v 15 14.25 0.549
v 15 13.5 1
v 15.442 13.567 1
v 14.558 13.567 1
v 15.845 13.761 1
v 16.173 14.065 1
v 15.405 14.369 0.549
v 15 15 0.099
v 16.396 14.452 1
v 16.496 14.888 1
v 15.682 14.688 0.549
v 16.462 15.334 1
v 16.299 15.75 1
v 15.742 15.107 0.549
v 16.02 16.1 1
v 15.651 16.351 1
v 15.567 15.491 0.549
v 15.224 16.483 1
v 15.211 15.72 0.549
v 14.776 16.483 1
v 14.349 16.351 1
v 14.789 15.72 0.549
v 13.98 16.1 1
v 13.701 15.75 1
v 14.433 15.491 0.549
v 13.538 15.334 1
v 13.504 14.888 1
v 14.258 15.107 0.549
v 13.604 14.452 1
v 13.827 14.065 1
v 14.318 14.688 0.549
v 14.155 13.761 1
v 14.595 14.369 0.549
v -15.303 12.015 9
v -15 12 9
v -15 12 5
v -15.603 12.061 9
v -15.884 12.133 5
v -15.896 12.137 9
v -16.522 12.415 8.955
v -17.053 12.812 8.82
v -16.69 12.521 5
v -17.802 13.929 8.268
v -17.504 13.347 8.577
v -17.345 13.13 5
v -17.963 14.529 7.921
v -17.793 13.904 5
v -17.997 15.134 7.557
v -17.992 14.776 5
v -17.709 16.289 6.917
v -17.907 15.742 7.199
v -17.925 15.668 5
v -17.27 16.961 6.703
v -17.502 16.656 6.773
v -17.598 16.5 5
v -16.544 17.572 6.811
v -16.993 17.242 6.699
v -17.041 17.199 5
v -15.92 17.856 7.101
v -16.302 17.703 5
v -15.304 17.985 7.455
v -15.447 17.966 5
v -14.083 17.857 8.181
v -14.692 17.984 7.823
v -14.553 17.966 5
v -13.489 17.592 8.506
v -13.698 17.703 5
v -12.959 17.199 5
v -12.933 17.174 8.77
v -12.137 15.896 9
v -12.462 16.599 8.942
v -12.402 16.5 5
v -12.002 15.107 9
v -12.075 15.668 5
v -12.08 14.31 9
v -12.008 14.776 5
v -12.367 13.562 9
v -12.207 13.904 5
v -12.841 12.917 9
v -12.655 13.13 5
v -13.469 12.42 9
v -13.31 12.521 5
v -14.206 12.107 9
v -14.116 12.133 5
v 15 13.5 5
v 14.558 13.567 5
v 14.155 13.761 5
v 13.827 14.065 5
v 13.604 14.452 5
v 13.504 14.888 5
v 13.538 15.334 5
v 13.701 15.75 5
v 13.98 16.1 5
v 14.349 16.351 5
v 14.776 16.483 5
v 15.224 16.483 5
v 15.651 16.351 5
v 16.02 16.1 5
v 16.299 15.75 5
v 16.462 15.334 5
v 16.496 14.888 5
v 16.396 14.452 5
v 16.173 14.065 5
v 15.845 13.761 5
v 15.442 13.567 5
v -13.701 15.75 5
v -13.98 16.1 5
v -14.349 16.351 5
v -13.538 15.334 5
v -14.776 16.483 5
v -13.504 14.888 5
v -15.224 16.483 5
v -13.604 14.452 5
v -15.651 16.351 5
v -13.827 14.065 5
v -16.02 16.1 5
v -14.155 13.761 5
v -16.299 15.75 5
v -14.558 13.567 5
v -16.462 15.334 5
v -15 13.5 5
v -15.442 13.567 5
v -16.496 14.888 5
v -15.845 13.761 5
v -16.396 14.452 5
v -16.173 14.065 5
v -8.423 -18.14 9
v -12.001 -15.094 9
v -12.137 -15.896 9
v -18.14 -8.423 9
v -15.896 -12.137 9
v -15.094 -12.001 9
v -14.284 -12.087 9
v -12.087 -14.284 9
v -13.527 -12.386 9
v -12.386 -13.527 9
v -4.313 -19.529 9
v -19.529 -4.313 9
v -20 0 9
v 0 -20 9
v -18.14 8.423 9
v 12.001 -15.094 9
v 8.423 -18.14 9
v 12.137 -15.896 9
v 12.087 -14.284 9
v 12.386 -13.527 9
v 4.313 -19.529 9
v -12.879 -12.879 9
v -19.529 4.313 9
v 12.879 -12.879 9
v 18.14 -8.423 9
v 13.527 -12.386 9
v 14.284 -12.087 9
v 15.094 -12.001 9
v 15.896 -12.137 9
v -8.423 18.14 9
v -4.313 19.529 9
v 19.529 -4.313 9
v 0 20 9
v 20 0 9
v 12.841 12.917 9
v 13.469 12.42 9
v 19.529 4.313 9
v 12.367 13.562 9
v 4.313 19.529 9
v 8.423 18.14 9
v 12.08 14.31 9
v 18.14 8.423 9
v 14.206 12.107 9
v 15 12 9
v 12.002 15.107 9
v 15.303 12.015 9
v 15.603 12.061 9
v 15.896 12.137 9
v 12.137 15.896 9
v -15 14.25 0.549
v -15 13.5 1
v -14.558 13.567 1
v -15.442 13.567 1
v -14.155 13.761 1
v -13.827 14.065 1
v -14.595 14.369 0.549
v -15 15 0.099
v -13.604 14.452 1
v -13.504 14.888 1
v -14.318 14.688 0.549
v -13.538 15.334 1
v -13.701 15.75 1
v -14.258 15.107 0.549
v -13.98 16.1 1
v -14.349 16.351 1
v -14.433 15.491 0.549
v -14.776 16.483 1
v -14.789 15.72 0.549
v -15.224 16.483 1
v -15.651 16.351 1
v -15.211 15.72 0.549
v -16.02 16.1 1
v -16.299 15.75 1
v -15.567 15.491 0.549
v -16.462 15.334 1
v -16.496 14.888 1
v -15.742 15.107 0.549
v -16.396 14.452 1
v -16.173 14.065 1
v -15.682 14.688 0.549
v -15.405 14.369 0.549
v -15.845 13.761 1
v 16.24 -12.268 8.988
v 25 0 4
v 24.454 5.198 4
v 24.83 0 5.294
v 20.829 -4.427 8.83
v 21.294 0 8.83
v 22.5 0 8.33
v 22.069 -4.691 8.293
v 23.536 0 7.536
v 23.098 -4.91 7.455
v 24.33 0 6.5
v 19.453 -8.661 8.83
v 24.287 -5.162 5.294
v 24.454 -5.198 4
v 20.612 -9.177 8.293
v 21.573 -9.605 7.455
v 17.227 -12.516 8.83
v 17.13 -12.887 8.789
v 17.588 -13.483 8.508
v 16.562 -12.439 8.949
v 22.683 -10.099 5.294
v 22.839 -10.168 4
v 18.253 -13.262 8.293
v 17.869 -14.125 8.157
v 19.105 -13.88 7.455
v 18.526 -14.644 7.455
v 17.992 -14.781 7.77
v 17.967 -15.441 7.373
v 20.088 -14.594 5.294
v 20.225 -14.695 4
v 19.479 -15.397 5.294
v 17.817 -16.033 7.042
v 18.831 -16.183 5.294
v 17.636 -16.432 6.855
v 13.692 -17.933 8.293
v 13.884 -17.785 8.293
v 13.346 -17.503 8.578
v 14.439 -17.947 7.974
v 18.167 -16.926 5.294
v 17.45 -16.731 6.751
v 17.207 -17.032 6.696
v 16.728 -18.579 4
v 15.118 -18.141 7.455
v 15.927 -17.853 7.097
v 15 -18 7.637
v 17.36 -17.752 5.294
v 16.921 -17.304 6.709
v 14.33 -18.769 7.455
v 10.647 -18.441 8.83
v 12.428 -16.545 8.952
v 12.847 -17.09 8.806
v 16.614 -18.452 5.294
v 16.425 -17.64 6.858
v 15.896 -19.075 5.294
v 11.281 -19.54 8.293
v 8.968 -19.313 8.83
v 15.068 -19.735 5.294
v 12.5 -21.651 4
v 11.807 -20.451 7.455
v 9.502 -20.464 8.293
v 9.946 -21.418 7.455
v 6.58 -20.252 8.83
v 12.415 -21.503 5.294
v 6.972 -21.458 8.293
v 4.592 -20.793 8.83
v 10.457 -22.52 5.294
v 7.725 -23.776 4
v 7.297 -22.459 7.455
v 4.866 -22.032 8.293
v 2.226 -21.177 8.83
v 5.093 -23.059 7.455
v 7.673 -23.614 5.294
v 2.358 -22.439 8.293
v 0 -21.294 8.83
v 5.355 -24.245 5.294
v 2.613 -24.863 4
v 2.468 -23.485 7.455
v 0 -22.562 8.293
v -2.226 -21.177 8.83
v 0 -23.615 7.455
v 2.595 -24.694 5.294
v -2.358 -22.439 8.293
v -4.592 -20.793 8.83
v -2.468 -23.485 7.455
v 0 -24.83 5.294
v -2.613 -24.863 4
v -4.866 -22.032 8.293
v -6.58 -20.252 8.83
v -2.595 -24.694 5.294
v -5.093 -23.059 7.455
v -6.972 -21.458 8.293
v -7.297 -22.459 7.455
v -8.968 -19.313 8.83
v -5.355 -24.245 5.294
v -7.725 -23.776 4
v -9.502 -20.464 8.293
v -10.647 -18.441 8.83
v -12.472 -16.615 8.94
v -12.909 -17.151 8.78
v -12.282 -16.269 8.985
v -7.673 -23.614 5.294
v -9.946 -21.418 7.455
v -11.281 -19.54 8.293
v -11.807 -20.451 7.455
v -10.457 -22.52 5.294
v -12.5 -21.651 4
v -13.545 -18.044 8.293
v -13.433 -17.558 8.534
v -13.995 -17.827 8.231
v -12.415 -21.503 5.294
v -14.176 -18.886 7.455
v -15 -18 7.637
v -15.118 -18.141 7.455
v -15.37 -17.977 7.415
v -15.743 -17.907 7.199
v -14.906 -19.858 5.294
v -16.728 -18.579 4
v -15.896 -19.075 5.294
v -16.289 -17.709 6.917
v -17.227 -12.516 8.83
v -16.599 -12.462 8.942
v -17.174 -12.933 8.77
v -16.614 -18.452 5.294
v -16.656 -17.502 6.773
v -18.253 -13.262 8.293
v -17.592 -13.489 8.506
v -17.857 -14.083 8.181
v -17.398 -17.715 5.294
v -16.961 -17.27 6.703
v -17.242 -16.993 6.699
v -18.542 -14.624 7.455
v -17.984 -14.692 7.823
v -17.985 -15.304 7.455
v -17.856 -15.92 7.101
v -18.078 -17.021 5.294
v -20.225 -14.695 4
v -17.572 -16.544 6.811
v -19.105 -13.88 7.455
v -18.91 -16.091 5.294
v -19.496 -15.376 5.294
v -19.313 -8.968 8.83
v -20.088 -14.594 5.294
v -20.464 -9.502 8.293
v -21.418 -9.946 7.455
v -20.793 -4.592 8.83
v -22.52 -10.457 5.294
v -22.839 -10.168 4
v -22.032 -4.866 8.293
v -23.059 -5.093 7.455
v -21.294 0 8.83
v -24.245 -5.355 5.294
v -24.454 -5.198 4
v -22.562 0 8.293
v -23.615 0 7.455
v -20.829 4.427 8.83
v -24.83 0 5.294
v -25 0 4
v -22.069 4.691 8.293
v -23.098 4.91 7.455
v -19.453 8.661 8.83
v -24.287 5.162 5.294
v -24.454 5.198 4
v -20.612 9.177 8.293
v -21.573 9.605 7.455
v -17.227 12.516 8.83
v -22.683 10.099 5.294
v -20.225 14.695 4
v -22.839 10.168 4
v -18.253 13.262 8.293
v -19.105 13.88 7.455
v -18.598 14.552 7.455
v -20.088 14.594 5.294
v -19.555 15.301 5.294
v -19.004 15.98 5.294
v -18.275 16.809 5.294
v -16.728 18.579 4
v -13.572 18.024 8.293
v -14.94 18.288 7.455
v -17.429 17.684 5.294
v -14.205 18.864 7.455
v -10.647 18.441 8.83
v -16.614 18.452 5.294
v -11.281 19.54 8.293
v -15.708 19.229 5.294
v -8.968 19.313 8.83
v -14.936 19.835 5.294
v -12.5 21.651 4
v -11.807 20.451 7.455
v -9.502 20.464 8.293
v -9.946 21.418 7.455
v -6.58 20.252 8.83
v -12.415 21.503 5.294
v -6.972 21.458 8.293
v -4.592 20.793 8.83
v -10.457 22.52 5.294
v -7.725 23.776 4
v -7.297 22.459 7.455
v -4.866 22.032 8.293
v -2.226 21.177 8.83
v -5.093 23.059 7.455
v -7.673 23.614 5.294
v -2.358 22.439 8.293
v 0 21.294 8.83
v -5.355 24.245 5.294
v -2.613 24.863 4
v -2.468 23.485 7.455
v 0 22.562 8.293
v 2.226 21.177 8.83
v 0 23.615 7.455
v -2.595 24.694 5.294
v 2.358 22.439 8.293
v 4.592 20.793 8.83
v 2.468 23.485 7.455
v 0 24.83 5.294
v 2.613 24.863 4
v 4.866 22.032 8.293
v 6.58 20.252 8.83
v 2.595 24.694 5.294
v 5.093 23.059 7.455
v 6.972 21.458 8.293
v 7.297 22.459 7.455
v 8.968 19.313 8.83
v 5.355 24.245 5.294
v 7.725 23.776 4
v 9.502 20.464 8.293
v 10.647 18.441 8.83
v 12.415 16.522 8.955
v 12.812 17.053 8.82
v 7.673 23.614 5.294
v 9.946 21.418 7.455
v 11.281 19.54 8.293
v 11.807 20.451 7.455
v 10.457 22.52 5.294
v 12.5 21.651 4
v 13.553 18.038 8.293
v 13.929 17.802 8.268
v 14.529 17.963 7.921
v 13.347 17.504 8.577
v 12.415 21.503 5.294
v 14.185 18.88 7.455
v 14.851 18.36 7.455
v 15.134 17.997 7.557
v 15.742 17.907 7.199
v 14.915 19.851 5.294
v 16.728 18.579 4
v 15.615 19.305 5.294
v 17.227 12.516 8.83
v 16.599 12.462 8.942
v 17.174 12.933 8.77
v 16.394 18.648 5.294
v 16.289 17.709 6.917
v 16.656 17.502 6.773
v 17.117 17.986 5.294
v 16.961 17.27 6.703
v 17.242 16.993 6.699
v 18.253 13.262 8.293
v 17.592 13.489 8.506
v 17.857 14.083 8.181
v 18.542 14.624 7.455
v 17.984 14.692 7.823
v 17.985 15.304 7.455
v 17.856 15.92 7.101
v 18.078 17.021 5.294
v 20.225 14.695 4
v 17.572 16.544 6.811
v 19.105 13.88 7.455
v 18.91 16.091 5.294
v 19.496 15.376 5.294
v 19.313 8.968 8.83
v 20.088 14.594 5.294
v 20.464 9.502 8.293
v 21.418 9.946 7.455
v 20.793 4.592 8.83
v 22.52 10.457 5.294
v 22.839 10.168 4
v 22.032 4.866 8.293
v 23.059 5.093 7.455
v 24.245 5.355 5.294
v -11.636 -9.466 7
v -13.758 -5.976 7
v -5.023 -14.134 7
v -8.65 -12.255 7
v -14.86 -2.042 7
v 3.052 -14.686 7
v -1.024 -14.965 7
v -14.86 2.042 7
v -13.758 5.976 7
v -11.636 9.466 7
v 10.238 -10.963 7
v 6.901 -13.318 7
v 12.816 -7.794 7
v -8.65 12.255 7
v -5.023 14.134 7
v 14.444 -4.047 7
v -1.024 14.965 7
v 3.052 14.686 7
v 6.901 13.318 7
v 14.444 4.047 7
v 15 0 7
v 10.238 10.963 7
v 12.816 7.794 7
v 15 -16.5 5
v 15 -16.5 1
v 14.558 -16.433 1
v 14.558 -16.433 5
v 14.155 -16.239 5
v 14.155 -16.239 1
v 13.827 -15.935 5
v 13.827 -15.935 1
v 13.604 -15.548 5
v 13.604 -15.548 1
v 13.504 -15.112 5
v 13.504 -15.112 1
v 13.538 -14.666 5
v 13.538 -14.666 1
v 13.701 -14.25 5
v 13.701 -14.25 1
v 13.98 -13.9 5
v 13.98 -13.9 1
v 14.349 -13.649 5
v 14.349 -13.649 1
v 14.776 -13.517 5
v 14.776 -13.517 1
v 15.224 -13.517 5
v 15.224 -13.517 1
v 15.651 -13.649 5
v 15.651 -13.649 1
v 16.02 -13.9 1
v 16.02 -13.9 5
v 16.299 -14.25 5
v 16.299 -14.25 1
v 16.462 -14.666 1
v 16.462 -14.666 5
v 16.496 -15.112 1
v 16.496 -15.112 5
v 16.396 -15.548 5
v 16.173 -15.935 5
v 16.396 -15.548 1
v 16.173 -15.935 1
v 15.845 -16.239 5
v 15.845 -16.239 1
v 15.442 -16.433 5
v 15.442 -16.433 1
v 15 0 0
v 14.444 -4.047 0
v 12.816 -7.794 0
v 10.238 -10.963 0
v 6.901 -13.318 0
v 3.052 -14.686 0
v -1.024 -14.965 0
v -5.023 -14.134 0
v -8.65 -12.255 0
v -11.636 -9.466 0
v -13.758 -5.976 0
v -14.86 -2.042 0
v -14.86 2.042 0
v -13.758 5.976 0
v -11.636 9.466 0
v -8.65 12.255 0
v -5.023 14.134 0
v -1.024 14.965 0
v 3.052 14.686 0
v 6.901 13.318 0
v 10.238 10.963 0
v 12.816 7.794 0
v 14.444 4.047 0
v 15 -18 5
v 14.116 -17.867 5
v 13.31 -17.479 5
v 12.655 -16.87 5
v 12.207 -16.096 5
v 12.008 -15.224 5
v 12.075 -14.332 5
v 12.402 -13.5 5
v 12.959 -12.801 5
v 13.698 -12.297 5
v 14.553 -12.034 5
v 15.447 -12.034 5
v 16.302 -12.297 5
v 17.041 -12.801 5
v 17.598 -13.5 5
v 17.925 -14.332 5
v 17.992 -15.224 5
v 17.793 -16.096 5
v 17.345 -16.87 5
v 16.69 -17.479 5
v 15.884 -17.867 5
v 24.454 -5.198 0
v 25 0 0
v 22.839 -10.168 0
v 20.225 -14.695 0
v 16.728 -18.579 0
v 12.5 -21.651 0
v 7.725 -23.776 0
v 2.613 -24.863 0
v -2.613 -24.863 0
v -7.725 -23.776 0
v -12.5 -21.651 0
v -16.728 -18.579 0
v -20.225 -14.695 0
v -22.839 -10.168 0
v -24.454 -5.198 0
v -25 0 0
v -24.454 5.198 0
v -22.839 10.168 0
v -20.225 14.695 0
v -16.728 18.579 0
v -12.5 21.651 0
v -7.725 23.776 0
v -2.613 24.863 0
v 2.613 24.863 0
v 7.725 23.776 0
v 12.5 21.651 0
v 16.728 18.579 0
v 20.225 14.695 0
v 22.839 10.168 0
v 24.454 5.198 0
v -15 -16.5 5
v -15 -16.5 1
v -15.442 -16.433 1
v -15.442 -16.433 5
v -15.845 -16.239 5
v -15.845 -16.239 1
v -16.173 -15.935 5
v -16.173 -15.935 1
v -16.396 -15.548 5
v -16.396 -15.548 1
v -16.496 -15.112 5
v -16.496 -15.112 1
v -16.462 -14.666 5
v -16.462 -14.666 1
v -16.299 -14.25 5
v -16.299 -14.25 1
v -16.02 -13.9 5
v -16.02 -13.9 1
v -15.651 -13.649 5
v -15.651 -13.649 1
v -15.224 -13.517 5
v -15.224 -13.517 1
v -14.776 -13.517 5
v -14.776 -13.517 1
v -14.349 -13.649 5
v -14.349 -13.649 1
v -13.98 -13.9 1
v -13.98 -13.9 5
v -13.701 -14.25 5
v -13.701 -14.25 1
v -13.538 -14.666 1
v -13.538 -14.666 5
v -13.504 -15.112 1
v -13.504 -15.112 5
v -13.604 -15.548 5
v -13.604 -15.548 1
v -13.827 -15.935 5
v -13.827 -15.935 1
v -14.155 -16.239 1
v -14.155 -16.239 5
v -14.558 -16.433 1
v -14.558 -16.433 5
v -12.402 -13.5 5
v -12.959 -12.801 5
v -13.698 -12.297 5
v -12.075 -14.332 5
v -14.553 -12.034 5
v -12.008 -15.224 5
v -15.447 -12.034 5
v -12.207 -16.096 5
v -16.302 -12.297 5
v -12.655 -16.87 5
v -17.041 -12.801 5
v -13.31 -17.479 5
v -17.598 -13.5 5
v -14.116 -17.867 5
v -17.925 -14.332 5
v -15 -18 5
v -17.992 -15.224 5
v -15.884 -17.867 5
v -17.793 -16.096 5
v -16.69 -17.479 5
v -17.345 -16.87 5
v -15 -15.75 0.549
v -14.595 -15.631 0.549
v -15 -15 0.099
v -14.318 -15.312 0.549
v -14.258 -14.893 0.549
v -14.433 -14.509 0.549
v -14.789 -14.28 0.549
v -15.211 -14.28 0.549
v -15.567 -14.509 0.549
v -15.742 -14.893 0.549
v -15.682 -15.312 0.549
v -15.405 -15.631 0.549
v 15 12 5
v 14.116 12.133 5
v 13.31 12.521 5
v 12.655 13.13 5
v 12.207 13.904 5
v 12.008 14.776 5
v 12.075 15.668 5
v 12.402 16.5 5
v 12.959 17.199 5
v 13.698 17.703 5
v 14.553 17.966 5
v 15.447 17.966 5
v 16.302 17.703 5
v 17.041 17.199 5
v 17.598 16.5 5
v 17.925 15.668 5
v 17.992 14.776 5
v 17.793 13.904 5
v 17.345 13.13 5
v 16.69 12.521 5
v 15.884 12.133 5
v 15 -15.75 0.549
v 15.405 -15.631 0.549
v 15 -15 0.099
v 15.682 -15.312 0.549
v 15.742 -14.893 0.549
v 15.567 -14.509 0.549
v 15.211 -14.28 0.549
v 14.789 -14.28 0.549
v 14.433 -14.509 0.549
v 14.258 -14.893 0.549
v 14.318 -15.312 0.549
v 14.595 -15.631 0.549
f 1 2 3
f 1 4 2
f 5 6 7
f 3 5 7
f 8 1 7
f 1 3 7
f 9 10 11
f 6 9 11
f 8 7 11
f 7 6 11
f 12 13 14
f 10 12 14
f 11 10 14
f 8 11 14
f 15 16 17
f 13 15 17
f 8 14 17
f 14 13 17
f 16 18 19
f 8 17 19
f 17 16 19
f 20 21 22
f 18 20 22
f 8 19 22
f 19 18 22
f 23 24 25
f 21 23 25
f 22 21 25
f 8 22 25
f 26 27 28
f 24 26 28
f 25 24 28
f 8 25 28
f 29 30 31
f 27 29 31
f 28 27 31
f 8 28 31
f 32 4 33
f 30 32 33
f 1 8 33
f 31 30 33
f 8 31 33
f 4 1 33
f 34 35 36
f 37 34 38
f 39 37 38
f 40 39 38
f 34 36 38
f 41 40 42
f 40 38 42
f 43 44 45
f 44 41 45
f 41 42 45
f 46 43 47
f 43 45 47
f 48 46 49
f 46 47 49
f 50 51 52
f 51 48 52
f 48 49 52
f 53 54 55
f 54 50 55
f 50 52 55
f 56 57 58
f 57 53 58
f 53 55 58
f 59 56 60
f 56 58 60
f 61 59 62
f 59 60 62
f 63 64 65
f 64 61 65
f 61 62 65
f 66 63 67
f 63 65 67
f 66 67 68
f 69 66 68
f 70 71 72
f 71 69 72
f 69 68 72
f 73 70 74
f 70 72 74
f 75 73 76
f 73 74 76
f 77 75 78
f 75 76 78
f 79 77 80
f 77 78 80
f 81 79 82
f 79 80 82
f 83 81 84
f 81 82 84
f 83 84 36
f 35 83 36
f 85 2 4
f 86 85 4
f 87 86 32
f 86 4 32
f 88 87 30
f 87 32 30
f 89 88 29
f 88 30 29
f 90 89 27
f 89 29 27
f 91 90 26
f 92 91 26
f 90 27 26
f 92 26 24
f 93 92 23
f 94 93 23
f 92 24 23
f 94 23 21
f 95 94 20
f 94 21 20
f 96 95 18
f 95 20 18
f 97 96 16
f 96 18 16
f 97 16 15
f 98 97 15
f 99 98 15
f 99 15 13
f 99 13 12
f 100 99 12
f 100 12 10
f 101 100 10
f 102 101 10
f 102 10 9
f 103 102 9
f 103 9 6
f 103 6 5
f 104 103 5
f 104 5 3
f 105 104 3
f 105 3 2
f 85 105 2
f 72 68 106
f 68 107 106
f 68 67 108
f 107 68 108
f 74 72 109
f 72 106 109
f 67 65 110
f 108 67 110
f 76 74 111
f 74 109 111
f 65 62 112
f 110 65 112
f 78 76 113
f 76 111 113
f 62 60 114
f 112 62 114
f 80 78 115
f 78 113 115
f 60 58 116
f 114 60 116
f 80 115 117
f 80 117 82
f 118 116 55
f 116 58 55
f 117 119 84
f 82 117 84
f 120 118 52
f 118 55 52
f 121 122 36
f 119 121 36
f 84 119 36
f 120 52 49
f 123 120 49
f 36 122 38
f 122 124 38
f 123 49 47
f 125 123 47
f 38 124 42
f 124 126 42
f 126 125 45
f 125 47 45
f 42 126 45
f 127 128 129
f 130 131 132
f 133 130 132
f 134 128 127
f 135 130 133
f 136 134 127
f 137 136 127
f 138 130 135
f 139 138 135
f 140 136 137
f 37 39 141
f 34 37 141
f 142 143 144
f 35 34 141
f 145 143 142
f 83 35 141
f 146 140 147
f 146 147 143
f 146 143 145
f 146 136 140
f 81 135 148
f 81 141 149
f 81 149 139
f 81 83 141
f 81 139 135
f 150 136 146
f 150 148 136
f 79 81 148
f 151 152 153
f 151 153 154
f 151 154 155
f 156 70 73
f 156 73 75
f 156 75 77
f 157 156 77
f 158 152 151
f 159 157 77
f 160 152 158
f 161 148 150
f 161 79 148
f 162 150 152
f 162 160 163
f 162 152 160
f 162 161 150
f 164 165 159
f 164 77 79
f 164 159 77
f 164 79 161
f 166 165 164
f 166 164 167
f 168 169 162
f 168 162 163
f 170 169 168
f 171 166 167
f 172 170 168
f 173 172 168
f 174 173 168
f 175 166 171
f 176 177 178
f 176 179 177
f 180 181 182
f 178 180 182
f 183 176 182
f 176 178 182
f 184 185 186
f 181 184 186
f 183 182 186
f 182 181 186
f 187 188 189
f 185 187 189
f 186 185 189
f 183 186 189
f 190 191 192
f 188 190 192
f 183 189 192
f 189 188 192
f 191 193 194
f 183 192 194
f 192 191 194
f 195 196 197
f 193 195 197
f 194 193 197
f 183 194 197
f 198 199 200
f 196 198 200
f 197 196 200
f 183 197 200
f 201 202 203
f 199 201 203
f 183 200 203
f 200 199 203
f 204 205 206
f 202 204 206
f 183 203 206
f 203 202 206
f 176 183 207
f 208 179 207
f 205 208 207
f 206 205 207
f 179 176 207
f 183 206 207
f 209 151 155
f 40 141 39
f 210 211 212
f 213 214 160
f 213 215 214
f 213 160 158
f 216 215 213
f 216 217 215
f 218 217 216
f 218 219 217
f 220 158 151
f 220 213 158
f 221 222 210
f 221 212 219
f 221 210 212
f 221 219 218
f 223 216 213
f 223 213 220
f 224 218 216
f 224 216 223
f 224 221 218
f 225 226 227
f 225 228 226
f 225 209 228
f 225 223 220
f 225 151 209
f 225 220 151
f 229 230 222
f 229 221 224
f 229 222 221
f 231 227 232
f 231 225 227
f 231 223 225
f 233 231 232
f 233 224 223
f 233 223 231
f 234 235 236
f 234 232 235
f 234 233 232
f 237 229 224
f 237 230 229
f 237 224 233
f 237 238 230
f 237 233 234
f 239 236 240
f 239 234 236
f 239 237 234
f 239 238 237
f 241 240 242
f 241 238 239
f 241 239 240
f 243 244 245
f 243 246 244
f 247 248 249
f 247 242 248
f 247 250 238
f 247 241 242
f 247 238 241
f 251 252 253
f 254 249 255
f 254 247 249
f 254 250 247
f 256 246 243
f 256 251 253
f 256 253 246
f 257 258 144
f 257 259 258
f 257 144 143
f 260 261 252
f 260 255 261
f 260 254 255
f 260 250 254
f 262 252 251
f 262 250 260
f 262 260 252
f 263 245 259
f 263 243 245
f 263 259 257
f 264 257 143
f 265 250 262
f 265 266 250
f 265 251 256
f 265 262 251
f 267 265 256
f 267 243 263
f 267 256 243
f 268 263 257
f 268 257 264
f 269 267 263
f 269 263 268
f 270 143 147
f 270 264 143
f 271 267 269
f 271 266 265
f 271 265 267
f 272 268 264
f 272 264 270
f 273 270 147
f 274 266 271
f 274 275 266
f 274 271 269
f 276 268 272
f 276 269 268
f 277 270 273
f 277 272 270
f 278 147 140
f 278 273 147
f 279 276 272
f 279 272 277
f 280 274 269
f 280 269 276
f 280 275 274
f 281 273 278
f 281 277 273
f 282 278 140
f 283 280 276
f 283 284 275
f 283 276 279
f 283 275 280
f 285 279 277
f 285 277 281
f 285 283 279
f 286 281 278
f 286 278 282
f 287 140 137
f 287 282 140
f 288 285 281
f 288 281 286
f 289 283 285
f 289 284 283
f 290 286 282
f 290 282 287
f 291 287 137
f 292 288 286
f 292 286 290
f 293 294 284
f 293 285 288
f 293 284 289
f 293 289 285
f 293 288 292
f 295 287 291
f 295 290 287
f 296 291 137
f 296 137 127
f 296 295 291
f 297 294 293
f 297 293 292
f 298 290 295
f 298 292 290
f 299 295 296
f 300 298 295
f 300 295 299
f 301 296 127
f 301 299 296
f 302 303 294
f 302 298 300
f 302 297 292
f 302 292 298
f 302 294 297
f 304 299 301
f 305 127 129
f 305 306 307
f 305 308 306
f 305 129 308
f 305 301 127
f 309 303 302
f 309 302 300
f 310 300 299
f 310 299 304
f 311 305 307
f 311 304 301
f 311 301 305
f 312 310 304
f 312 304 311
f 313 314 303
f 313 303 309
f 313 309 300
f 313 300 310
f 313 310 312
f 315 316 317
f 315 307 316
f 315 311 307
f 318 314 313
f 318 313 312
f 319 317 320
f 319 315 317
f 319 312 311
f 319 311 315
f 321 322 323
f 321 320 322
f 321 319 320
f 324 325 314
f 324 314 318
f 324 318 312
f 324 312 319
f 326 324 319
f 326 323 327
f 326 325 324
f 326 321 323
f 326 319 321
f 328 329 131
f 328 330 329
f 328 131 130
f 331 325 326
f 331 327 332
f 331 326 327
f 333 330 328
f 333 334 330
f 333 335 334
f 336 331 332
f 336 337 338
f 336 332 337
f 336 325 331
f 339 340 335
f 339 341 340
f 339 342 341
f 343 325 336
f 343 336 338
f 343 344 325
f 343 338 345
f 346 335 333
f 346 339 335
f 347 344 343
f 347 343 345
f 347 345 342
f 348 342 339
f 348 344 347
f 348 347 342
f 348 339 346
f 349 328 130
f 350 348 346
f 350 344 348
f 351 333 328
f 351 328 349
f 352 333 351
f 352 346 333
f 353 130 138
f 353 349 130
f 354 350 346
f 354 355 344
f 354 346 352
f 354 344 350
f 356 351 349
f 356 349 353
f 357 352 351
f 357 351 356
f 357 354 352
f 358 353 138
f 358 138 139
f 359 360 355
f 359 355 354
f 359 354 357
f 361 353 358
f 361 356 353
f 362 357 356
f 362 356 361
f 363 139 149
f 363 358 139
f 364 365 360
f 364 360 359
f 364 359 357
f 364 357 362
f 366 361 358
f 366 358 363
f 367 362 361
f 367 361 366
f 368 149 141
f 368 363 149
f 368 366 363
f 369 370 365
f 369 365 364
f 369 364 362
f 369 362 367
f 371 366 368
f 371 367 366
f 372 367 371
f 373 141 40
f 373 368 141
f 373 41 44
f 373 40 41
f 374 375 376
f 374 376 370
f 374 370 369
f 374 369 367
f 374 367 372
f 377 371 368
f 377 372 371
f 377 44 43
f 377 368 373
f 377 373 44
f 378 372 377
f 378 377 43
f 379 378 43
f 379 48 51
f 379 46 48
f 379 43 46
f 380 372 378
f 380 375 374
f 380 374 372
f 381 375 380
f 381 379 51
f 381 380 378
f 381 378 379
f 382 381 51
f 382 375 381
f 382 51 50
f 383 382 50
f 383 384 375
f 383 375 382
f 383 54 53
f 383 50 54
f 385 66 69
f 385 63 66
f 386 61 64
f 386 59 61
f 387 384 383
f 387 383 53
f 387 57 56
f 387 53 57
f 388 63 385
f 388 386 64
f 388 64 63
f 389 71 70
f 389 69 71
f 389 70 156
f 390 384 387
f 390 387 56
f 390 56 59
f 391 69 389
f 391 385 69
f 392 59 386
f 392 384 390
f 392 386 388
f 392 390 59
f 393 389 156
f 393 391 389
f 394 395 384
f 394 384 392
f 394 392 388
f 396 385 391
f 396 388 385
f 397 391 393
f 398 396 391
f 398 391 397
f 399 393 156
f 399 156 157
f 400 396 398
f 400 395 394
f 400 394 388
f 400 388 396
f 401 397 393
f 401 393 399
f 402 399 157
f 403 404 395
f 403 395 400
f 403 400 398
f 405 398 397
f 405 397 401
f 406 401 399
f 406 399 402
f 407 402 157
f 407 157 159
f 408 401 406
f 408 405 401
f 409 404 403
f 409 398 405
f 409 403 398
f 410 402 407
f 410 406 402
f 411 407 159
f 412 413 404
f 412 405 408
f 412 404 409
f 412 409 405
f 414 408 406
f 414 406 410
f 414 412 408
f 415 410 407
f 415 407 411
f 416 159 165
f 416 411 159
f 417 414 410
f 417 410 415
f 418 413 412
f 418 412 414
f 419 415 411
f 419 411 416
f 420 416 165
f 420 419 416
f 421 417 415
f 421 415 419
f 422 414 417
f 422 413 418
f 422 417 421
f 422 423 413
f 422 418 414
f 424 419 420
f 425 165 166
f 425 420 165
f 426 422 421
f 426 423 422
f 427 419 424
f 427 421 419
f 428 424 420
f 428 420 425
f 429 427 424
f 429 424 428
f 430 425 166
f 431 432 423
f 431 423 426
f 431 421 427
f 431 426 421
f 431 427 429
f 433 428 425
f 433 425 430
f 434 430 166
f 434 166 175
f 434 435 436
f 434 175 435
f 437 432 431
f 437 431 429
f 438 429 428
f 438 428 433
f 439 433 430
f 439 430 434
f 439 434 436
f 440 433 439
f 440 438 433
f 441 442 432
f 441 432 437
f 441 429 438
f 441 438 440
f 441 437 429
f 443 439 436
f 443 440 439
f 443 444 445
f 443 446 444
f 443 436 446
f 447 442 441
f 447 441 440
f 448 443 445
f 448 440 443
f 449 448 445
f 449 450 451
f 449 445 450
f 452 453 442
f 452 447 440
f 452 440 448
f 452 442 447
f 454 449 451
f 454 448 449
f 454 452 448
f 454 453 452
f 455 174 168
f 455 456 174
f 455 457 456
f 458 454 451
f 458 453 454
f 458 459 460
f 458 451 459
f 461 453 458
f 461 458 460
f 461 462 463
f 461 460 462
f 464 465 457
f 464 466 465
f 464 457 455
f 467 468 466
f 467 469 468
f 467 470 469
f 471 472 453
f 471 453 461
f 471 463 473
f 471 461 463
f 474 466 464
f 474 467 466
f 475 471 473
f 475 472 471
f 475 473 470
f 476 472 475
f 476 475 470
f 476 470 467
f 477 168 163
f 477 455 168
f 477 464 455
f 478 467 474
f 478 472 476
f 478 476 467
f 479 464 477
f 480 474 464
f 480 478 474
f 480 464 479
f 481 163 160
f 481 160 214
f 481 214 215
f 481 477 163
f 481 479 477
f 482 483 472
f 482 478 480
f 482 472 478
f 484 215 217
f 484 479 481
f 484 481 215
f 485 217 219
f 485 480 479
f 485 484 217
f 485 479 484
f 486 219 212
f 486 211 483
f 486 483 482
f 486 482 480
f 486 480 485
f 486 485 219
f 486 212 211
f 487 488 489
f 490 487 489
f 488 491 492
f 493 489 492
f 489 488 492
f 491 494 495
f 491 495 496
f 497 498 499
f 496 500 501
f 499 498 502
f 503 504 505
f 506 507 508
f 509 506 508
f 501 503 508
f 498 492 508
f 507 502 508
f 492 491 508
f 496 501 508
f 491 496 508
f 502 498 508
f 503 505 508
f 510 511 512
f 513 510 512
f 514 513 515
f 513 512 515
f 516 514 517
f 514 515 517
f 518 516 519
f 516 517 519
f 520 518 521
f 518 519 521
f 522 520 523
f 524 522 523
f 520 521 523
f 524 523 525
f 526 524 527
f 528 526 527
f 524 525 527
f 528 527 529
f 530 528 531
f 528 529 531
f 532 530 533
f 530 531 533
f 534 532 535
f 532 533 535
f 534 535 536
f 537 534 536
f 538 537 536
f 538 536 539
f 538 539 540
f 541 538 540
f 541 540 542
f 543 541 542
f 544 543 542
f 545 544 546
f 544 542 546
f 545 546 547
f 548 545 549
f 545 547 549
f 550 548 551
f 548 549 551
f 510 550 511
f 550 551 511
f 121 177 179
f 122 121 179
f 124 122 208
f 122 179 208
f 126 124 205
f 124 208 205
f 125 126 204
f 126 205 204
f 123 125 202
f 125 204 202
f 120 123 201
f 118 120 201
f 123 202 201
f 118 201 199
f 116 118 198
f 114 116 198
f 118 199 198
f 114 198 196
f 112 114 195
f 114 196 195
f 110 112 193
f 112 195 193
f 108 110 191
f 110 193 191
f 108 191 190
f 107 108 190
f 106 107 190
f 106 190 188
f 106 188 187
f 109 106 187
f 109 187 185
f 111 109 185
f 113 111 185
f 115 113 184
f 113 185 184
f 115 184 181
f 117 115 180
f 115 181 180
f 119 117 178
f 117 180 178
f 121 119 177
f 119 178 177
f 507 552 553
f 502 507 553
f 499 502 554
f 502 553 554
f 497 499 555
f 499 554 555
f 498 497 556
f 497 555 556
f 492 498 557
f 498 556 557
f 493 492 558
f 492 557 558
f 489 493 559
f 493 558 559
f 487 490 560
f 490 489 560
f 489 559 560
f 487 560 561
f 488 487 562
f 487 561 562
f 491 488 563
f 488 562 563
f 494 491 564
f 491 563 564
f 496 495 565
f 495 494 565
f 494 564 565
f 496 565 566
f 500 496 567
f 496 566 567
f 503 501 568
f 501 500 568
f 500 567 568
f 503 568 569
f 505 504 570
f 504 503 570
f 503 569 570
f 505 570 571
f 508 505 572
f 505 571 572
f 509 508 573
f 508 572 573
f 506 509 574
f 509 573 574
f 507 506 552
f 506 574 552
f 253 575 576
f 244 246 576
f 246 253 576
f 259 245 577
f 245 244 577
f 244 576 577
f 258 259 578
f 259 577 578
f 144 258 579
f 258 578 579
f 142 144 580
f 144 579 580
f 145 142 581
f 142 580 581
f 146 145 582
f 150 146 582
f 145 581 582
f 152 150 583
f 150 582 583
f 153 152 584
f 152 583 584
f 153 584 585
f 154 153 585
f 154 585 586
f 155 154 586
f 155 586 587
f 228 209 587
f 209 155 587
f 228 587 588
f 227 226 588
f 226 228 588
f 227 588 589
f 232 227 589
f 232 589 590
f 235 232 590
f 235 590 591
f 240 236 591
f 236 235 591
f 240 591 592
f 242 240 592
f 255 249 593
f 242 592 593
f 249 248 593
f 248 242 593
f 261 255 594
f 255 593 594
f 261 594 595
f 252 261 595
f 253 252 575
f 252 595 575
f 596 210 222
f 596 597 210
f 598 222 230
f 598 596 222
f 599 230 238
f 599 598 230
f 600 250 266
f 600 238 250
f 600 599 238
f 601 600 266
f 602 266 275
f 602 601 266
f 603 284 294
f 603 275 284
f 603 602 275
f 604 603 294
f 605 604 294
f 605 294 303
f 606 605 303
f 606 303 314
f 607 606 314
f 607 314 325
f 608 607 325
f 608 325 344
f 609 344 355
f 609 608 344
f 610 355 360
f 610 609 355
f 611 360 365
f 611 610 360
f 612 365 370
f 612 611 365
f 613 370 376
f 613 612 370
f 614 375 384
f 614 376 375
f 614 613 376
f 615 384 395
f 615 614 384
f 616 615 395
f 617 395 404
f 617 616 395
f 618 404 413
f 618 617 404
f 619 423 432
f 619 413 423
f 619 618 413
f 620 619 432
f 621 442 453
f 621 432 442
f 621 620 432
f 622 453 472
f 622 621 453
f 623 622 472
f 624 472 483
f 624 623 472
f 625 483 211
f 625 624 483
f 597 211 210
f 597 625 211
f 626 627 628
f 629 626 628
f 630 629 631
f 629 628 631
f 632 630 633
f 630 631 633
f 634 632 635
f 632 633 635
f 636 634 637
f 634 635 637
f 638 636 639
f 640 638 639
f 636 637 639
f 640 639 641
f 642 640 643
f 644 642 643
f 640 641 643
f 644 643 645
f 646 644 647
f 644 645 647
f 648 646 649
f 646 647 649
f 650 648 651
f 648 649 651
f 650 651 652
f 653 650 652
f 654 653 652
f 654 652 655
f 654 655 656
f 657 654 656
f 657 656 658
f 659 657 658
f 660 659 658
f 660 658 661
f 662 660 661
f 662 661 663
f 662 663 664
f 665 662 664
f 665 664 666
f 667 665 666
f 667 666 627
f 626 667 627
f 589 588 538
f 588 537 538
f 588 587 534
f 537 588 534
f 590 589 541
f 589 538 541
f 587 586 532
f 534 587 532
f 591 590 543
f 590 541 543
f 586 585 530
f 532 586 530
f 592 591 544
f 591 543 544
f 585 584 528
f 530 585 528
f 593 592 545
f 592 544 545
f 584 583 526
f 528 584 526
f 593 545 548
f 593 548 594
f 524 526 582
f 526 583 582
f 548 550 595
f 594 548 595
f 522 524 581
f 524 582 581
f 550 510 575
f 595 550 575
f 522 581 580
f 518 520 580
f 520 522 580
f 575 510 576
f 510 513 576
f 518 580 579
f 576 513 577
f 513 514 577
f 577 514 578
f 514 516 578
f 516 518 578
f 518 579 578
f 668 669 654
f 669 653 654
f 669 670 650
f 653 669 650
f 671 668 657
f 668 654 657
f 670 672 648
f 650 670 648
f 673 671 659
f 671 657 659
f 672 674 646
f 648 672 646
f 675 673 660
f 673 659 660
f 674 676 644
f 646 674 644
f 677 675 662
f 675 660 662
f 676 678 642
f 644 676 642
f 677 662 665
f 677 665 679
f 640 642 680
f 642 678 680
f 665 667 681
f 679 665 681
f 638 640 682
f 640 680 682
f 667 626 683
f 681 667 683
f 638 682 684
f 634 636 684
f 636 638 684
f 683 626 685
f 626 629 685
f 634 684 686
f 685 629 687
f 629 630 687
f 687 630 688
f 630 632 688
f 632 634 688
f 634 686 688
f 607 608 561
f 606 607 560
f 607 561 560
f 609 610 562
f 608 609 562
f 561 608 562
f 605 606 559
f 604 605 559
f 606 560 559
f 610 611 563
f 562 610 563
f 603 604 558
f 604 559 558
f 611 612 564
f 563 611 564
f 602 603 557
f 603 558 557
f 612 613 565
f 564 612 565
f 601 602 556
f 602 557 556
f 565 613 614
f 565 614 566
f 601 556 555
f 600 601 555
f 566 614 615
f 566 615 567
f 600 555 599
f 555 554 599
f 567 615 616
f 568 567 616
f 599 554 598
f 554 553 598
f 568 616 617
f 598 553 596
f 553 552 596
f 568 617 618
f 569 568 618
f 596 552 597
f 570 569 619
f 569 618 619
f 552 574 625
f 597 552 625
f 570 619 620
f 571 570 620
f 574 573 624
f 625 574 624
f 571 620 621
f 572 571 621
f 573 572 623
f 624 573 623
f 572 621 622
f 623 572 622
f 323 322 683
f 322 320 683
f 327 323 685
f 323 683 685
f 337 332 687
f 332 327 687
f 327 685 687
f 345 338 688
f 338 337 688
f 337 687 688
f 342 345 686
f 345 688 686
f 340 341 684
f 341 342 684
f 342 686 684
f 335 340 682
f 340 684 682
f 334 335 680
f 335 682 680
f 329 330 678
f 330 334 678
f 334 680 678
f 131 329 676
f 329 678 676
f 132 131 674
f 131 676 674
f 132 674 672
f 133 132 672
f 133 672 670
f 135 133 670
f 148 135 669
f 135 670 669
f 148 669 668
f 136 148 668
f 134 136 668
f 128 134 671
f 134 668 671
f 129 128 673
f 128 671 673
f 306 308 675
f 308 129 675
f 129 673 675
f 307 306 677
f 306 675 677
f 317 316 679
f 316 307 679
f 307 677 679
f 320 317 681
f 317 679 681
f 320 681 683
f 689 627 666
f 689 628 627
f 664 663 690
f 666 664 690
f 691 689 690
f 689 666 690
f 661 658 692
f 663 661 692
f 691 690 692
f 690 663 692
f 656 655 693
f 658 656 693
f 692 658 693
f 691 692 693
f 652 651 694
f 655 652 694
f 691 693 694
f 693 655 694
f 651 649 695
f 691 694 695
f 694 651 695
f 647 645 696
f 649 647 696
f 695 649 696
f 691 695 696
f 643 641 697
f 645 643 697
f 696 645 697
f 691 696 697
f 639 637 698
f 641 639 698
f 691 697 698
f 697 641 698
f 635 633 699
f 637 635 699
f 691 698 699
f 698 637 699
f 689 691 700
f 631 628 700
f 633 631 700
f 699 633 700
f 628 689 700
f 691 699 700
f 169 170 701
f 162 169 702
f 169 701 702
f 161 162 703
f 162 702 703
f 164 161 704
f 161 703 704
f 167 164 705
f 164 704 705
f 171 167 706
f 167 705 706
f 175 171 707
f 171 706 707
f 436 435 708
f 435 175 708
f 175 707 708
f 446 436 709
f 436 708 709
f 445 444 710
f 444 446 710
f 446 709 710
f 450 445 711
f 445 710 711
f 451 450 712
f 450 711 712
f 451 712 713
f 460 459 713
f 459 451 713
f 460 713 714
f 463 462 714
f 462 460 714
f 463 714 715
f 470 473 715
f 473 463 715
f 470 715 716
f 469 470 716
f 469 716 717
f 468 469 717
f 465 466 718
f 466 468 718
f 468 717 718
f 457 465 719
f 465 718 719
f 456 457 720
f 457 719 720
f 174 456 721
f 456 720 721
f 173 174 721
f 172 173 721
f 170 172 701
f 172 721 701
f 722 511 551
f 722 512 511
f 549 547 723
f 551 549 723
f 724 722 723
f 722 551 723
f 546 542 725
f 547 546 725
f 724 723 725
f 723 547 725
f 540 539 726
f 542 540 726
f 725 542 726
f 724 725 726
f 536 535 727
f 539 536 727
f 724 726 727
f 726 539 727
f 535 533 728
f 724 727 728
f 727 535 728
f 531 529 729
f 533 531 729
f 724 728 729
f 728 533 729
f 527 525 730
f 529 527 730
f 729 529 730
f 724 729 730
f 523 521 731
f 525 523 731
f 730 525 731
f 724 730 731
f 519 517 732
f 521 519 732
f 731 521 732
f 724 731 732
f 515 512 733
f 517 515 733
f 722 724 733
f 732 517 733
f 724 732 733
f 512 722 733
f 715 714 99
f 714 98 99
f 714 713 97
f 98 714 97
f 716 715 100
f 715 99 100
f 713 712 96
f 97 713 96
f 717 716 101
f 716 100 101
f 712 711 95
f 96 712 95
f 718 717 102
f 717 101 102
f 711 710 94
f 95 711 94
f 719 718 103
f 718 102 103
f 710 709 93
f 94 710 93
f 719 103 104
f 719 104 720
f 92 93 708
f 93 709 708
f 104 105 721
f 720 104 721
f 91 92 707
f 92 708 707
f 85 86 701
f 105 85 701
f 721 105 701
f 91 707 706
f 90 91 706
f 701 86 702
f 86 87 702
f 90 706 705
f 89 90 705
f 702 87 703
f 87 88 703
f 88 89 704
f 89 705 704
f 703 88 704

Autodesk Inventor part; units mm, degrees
ref_plane "YZ Plane" through (0, 0, 0) normal (1, 0, 0) x (0, 1, 0)
ref_plane "XZ Plane" through (0, 0, 0) normal (0, 1, 0) x (-1, 0, 0)
ref_plane "XY Plane" through (0, 0, 0) normal (0, 0, 1) x (1, 0, 0)
sketch "Skizze1" plane through (0, 0, 0) normal (0, 0, 1) x (1, 0, 0)
  circle A0 centre (0, 0) radius 11.1 construction
  circle A1 centre (0, 0) radius 25 projected
  circle A2 centre (0, 0) radius 15
  circle A3 centre (-15, -15) radius 1.25 projected
  circle A4 centre (15, 15) radius 1.25 projected
  circle A5 centre (15, -15) radius 1.25 projected
  circle A6 centre (-15, 15) radius 1.25 projected
  point P0 (0, 0)
  dimension "d0" = 30
extrude "Extrusion1" add sketch "Skizze1" along normal blind 9 contours A1 | A3 | A4 | A5 | A6
sketch "Skizze2" plane through (0, 0, 9) normal (0, 0, 1) x (1, 0, 0)
  circle A0 centre (0, 0) radius 15 projected
  circle A1 centre (0, 0) radius 25 projected
  point P0 (0, 0)
extrude "Extrusion2" add sketch "Skizze2" against normal blind 2 contours A0
fillet "Rundung1" radius 5 1 edges at (-25, 0, 9)
sketch "Skizze3" plane through (0, 0, 9) normal (0, 0, 1) x (1, 0, 0)
  line L0 (-15, -15) -> (15, -15)
  line L1 (15, -15) -> (15, 15)
  line L2 (15, 15) -> (-15, 15)
  line L3 (-15, 15) -> (-15, -15)
  line L4 (-15, -15) -> (15, 15) construction
  line L5 (15, -15) -> (-15, 15) construction
  point P0 (0, 0)
  dimension "d6" = 30
hole "Bohrung1" at (-15, 15, 9) at (15, 15, 9) at (15, -15, 9) at (-15, -15, 9) direction (0, 0, -1) diameter 3 depth 8 tip angle 118 counterbore diameter 6 counterbore depth 4
properties part number "Cover_G2" material "ABS-Kunststoff"
